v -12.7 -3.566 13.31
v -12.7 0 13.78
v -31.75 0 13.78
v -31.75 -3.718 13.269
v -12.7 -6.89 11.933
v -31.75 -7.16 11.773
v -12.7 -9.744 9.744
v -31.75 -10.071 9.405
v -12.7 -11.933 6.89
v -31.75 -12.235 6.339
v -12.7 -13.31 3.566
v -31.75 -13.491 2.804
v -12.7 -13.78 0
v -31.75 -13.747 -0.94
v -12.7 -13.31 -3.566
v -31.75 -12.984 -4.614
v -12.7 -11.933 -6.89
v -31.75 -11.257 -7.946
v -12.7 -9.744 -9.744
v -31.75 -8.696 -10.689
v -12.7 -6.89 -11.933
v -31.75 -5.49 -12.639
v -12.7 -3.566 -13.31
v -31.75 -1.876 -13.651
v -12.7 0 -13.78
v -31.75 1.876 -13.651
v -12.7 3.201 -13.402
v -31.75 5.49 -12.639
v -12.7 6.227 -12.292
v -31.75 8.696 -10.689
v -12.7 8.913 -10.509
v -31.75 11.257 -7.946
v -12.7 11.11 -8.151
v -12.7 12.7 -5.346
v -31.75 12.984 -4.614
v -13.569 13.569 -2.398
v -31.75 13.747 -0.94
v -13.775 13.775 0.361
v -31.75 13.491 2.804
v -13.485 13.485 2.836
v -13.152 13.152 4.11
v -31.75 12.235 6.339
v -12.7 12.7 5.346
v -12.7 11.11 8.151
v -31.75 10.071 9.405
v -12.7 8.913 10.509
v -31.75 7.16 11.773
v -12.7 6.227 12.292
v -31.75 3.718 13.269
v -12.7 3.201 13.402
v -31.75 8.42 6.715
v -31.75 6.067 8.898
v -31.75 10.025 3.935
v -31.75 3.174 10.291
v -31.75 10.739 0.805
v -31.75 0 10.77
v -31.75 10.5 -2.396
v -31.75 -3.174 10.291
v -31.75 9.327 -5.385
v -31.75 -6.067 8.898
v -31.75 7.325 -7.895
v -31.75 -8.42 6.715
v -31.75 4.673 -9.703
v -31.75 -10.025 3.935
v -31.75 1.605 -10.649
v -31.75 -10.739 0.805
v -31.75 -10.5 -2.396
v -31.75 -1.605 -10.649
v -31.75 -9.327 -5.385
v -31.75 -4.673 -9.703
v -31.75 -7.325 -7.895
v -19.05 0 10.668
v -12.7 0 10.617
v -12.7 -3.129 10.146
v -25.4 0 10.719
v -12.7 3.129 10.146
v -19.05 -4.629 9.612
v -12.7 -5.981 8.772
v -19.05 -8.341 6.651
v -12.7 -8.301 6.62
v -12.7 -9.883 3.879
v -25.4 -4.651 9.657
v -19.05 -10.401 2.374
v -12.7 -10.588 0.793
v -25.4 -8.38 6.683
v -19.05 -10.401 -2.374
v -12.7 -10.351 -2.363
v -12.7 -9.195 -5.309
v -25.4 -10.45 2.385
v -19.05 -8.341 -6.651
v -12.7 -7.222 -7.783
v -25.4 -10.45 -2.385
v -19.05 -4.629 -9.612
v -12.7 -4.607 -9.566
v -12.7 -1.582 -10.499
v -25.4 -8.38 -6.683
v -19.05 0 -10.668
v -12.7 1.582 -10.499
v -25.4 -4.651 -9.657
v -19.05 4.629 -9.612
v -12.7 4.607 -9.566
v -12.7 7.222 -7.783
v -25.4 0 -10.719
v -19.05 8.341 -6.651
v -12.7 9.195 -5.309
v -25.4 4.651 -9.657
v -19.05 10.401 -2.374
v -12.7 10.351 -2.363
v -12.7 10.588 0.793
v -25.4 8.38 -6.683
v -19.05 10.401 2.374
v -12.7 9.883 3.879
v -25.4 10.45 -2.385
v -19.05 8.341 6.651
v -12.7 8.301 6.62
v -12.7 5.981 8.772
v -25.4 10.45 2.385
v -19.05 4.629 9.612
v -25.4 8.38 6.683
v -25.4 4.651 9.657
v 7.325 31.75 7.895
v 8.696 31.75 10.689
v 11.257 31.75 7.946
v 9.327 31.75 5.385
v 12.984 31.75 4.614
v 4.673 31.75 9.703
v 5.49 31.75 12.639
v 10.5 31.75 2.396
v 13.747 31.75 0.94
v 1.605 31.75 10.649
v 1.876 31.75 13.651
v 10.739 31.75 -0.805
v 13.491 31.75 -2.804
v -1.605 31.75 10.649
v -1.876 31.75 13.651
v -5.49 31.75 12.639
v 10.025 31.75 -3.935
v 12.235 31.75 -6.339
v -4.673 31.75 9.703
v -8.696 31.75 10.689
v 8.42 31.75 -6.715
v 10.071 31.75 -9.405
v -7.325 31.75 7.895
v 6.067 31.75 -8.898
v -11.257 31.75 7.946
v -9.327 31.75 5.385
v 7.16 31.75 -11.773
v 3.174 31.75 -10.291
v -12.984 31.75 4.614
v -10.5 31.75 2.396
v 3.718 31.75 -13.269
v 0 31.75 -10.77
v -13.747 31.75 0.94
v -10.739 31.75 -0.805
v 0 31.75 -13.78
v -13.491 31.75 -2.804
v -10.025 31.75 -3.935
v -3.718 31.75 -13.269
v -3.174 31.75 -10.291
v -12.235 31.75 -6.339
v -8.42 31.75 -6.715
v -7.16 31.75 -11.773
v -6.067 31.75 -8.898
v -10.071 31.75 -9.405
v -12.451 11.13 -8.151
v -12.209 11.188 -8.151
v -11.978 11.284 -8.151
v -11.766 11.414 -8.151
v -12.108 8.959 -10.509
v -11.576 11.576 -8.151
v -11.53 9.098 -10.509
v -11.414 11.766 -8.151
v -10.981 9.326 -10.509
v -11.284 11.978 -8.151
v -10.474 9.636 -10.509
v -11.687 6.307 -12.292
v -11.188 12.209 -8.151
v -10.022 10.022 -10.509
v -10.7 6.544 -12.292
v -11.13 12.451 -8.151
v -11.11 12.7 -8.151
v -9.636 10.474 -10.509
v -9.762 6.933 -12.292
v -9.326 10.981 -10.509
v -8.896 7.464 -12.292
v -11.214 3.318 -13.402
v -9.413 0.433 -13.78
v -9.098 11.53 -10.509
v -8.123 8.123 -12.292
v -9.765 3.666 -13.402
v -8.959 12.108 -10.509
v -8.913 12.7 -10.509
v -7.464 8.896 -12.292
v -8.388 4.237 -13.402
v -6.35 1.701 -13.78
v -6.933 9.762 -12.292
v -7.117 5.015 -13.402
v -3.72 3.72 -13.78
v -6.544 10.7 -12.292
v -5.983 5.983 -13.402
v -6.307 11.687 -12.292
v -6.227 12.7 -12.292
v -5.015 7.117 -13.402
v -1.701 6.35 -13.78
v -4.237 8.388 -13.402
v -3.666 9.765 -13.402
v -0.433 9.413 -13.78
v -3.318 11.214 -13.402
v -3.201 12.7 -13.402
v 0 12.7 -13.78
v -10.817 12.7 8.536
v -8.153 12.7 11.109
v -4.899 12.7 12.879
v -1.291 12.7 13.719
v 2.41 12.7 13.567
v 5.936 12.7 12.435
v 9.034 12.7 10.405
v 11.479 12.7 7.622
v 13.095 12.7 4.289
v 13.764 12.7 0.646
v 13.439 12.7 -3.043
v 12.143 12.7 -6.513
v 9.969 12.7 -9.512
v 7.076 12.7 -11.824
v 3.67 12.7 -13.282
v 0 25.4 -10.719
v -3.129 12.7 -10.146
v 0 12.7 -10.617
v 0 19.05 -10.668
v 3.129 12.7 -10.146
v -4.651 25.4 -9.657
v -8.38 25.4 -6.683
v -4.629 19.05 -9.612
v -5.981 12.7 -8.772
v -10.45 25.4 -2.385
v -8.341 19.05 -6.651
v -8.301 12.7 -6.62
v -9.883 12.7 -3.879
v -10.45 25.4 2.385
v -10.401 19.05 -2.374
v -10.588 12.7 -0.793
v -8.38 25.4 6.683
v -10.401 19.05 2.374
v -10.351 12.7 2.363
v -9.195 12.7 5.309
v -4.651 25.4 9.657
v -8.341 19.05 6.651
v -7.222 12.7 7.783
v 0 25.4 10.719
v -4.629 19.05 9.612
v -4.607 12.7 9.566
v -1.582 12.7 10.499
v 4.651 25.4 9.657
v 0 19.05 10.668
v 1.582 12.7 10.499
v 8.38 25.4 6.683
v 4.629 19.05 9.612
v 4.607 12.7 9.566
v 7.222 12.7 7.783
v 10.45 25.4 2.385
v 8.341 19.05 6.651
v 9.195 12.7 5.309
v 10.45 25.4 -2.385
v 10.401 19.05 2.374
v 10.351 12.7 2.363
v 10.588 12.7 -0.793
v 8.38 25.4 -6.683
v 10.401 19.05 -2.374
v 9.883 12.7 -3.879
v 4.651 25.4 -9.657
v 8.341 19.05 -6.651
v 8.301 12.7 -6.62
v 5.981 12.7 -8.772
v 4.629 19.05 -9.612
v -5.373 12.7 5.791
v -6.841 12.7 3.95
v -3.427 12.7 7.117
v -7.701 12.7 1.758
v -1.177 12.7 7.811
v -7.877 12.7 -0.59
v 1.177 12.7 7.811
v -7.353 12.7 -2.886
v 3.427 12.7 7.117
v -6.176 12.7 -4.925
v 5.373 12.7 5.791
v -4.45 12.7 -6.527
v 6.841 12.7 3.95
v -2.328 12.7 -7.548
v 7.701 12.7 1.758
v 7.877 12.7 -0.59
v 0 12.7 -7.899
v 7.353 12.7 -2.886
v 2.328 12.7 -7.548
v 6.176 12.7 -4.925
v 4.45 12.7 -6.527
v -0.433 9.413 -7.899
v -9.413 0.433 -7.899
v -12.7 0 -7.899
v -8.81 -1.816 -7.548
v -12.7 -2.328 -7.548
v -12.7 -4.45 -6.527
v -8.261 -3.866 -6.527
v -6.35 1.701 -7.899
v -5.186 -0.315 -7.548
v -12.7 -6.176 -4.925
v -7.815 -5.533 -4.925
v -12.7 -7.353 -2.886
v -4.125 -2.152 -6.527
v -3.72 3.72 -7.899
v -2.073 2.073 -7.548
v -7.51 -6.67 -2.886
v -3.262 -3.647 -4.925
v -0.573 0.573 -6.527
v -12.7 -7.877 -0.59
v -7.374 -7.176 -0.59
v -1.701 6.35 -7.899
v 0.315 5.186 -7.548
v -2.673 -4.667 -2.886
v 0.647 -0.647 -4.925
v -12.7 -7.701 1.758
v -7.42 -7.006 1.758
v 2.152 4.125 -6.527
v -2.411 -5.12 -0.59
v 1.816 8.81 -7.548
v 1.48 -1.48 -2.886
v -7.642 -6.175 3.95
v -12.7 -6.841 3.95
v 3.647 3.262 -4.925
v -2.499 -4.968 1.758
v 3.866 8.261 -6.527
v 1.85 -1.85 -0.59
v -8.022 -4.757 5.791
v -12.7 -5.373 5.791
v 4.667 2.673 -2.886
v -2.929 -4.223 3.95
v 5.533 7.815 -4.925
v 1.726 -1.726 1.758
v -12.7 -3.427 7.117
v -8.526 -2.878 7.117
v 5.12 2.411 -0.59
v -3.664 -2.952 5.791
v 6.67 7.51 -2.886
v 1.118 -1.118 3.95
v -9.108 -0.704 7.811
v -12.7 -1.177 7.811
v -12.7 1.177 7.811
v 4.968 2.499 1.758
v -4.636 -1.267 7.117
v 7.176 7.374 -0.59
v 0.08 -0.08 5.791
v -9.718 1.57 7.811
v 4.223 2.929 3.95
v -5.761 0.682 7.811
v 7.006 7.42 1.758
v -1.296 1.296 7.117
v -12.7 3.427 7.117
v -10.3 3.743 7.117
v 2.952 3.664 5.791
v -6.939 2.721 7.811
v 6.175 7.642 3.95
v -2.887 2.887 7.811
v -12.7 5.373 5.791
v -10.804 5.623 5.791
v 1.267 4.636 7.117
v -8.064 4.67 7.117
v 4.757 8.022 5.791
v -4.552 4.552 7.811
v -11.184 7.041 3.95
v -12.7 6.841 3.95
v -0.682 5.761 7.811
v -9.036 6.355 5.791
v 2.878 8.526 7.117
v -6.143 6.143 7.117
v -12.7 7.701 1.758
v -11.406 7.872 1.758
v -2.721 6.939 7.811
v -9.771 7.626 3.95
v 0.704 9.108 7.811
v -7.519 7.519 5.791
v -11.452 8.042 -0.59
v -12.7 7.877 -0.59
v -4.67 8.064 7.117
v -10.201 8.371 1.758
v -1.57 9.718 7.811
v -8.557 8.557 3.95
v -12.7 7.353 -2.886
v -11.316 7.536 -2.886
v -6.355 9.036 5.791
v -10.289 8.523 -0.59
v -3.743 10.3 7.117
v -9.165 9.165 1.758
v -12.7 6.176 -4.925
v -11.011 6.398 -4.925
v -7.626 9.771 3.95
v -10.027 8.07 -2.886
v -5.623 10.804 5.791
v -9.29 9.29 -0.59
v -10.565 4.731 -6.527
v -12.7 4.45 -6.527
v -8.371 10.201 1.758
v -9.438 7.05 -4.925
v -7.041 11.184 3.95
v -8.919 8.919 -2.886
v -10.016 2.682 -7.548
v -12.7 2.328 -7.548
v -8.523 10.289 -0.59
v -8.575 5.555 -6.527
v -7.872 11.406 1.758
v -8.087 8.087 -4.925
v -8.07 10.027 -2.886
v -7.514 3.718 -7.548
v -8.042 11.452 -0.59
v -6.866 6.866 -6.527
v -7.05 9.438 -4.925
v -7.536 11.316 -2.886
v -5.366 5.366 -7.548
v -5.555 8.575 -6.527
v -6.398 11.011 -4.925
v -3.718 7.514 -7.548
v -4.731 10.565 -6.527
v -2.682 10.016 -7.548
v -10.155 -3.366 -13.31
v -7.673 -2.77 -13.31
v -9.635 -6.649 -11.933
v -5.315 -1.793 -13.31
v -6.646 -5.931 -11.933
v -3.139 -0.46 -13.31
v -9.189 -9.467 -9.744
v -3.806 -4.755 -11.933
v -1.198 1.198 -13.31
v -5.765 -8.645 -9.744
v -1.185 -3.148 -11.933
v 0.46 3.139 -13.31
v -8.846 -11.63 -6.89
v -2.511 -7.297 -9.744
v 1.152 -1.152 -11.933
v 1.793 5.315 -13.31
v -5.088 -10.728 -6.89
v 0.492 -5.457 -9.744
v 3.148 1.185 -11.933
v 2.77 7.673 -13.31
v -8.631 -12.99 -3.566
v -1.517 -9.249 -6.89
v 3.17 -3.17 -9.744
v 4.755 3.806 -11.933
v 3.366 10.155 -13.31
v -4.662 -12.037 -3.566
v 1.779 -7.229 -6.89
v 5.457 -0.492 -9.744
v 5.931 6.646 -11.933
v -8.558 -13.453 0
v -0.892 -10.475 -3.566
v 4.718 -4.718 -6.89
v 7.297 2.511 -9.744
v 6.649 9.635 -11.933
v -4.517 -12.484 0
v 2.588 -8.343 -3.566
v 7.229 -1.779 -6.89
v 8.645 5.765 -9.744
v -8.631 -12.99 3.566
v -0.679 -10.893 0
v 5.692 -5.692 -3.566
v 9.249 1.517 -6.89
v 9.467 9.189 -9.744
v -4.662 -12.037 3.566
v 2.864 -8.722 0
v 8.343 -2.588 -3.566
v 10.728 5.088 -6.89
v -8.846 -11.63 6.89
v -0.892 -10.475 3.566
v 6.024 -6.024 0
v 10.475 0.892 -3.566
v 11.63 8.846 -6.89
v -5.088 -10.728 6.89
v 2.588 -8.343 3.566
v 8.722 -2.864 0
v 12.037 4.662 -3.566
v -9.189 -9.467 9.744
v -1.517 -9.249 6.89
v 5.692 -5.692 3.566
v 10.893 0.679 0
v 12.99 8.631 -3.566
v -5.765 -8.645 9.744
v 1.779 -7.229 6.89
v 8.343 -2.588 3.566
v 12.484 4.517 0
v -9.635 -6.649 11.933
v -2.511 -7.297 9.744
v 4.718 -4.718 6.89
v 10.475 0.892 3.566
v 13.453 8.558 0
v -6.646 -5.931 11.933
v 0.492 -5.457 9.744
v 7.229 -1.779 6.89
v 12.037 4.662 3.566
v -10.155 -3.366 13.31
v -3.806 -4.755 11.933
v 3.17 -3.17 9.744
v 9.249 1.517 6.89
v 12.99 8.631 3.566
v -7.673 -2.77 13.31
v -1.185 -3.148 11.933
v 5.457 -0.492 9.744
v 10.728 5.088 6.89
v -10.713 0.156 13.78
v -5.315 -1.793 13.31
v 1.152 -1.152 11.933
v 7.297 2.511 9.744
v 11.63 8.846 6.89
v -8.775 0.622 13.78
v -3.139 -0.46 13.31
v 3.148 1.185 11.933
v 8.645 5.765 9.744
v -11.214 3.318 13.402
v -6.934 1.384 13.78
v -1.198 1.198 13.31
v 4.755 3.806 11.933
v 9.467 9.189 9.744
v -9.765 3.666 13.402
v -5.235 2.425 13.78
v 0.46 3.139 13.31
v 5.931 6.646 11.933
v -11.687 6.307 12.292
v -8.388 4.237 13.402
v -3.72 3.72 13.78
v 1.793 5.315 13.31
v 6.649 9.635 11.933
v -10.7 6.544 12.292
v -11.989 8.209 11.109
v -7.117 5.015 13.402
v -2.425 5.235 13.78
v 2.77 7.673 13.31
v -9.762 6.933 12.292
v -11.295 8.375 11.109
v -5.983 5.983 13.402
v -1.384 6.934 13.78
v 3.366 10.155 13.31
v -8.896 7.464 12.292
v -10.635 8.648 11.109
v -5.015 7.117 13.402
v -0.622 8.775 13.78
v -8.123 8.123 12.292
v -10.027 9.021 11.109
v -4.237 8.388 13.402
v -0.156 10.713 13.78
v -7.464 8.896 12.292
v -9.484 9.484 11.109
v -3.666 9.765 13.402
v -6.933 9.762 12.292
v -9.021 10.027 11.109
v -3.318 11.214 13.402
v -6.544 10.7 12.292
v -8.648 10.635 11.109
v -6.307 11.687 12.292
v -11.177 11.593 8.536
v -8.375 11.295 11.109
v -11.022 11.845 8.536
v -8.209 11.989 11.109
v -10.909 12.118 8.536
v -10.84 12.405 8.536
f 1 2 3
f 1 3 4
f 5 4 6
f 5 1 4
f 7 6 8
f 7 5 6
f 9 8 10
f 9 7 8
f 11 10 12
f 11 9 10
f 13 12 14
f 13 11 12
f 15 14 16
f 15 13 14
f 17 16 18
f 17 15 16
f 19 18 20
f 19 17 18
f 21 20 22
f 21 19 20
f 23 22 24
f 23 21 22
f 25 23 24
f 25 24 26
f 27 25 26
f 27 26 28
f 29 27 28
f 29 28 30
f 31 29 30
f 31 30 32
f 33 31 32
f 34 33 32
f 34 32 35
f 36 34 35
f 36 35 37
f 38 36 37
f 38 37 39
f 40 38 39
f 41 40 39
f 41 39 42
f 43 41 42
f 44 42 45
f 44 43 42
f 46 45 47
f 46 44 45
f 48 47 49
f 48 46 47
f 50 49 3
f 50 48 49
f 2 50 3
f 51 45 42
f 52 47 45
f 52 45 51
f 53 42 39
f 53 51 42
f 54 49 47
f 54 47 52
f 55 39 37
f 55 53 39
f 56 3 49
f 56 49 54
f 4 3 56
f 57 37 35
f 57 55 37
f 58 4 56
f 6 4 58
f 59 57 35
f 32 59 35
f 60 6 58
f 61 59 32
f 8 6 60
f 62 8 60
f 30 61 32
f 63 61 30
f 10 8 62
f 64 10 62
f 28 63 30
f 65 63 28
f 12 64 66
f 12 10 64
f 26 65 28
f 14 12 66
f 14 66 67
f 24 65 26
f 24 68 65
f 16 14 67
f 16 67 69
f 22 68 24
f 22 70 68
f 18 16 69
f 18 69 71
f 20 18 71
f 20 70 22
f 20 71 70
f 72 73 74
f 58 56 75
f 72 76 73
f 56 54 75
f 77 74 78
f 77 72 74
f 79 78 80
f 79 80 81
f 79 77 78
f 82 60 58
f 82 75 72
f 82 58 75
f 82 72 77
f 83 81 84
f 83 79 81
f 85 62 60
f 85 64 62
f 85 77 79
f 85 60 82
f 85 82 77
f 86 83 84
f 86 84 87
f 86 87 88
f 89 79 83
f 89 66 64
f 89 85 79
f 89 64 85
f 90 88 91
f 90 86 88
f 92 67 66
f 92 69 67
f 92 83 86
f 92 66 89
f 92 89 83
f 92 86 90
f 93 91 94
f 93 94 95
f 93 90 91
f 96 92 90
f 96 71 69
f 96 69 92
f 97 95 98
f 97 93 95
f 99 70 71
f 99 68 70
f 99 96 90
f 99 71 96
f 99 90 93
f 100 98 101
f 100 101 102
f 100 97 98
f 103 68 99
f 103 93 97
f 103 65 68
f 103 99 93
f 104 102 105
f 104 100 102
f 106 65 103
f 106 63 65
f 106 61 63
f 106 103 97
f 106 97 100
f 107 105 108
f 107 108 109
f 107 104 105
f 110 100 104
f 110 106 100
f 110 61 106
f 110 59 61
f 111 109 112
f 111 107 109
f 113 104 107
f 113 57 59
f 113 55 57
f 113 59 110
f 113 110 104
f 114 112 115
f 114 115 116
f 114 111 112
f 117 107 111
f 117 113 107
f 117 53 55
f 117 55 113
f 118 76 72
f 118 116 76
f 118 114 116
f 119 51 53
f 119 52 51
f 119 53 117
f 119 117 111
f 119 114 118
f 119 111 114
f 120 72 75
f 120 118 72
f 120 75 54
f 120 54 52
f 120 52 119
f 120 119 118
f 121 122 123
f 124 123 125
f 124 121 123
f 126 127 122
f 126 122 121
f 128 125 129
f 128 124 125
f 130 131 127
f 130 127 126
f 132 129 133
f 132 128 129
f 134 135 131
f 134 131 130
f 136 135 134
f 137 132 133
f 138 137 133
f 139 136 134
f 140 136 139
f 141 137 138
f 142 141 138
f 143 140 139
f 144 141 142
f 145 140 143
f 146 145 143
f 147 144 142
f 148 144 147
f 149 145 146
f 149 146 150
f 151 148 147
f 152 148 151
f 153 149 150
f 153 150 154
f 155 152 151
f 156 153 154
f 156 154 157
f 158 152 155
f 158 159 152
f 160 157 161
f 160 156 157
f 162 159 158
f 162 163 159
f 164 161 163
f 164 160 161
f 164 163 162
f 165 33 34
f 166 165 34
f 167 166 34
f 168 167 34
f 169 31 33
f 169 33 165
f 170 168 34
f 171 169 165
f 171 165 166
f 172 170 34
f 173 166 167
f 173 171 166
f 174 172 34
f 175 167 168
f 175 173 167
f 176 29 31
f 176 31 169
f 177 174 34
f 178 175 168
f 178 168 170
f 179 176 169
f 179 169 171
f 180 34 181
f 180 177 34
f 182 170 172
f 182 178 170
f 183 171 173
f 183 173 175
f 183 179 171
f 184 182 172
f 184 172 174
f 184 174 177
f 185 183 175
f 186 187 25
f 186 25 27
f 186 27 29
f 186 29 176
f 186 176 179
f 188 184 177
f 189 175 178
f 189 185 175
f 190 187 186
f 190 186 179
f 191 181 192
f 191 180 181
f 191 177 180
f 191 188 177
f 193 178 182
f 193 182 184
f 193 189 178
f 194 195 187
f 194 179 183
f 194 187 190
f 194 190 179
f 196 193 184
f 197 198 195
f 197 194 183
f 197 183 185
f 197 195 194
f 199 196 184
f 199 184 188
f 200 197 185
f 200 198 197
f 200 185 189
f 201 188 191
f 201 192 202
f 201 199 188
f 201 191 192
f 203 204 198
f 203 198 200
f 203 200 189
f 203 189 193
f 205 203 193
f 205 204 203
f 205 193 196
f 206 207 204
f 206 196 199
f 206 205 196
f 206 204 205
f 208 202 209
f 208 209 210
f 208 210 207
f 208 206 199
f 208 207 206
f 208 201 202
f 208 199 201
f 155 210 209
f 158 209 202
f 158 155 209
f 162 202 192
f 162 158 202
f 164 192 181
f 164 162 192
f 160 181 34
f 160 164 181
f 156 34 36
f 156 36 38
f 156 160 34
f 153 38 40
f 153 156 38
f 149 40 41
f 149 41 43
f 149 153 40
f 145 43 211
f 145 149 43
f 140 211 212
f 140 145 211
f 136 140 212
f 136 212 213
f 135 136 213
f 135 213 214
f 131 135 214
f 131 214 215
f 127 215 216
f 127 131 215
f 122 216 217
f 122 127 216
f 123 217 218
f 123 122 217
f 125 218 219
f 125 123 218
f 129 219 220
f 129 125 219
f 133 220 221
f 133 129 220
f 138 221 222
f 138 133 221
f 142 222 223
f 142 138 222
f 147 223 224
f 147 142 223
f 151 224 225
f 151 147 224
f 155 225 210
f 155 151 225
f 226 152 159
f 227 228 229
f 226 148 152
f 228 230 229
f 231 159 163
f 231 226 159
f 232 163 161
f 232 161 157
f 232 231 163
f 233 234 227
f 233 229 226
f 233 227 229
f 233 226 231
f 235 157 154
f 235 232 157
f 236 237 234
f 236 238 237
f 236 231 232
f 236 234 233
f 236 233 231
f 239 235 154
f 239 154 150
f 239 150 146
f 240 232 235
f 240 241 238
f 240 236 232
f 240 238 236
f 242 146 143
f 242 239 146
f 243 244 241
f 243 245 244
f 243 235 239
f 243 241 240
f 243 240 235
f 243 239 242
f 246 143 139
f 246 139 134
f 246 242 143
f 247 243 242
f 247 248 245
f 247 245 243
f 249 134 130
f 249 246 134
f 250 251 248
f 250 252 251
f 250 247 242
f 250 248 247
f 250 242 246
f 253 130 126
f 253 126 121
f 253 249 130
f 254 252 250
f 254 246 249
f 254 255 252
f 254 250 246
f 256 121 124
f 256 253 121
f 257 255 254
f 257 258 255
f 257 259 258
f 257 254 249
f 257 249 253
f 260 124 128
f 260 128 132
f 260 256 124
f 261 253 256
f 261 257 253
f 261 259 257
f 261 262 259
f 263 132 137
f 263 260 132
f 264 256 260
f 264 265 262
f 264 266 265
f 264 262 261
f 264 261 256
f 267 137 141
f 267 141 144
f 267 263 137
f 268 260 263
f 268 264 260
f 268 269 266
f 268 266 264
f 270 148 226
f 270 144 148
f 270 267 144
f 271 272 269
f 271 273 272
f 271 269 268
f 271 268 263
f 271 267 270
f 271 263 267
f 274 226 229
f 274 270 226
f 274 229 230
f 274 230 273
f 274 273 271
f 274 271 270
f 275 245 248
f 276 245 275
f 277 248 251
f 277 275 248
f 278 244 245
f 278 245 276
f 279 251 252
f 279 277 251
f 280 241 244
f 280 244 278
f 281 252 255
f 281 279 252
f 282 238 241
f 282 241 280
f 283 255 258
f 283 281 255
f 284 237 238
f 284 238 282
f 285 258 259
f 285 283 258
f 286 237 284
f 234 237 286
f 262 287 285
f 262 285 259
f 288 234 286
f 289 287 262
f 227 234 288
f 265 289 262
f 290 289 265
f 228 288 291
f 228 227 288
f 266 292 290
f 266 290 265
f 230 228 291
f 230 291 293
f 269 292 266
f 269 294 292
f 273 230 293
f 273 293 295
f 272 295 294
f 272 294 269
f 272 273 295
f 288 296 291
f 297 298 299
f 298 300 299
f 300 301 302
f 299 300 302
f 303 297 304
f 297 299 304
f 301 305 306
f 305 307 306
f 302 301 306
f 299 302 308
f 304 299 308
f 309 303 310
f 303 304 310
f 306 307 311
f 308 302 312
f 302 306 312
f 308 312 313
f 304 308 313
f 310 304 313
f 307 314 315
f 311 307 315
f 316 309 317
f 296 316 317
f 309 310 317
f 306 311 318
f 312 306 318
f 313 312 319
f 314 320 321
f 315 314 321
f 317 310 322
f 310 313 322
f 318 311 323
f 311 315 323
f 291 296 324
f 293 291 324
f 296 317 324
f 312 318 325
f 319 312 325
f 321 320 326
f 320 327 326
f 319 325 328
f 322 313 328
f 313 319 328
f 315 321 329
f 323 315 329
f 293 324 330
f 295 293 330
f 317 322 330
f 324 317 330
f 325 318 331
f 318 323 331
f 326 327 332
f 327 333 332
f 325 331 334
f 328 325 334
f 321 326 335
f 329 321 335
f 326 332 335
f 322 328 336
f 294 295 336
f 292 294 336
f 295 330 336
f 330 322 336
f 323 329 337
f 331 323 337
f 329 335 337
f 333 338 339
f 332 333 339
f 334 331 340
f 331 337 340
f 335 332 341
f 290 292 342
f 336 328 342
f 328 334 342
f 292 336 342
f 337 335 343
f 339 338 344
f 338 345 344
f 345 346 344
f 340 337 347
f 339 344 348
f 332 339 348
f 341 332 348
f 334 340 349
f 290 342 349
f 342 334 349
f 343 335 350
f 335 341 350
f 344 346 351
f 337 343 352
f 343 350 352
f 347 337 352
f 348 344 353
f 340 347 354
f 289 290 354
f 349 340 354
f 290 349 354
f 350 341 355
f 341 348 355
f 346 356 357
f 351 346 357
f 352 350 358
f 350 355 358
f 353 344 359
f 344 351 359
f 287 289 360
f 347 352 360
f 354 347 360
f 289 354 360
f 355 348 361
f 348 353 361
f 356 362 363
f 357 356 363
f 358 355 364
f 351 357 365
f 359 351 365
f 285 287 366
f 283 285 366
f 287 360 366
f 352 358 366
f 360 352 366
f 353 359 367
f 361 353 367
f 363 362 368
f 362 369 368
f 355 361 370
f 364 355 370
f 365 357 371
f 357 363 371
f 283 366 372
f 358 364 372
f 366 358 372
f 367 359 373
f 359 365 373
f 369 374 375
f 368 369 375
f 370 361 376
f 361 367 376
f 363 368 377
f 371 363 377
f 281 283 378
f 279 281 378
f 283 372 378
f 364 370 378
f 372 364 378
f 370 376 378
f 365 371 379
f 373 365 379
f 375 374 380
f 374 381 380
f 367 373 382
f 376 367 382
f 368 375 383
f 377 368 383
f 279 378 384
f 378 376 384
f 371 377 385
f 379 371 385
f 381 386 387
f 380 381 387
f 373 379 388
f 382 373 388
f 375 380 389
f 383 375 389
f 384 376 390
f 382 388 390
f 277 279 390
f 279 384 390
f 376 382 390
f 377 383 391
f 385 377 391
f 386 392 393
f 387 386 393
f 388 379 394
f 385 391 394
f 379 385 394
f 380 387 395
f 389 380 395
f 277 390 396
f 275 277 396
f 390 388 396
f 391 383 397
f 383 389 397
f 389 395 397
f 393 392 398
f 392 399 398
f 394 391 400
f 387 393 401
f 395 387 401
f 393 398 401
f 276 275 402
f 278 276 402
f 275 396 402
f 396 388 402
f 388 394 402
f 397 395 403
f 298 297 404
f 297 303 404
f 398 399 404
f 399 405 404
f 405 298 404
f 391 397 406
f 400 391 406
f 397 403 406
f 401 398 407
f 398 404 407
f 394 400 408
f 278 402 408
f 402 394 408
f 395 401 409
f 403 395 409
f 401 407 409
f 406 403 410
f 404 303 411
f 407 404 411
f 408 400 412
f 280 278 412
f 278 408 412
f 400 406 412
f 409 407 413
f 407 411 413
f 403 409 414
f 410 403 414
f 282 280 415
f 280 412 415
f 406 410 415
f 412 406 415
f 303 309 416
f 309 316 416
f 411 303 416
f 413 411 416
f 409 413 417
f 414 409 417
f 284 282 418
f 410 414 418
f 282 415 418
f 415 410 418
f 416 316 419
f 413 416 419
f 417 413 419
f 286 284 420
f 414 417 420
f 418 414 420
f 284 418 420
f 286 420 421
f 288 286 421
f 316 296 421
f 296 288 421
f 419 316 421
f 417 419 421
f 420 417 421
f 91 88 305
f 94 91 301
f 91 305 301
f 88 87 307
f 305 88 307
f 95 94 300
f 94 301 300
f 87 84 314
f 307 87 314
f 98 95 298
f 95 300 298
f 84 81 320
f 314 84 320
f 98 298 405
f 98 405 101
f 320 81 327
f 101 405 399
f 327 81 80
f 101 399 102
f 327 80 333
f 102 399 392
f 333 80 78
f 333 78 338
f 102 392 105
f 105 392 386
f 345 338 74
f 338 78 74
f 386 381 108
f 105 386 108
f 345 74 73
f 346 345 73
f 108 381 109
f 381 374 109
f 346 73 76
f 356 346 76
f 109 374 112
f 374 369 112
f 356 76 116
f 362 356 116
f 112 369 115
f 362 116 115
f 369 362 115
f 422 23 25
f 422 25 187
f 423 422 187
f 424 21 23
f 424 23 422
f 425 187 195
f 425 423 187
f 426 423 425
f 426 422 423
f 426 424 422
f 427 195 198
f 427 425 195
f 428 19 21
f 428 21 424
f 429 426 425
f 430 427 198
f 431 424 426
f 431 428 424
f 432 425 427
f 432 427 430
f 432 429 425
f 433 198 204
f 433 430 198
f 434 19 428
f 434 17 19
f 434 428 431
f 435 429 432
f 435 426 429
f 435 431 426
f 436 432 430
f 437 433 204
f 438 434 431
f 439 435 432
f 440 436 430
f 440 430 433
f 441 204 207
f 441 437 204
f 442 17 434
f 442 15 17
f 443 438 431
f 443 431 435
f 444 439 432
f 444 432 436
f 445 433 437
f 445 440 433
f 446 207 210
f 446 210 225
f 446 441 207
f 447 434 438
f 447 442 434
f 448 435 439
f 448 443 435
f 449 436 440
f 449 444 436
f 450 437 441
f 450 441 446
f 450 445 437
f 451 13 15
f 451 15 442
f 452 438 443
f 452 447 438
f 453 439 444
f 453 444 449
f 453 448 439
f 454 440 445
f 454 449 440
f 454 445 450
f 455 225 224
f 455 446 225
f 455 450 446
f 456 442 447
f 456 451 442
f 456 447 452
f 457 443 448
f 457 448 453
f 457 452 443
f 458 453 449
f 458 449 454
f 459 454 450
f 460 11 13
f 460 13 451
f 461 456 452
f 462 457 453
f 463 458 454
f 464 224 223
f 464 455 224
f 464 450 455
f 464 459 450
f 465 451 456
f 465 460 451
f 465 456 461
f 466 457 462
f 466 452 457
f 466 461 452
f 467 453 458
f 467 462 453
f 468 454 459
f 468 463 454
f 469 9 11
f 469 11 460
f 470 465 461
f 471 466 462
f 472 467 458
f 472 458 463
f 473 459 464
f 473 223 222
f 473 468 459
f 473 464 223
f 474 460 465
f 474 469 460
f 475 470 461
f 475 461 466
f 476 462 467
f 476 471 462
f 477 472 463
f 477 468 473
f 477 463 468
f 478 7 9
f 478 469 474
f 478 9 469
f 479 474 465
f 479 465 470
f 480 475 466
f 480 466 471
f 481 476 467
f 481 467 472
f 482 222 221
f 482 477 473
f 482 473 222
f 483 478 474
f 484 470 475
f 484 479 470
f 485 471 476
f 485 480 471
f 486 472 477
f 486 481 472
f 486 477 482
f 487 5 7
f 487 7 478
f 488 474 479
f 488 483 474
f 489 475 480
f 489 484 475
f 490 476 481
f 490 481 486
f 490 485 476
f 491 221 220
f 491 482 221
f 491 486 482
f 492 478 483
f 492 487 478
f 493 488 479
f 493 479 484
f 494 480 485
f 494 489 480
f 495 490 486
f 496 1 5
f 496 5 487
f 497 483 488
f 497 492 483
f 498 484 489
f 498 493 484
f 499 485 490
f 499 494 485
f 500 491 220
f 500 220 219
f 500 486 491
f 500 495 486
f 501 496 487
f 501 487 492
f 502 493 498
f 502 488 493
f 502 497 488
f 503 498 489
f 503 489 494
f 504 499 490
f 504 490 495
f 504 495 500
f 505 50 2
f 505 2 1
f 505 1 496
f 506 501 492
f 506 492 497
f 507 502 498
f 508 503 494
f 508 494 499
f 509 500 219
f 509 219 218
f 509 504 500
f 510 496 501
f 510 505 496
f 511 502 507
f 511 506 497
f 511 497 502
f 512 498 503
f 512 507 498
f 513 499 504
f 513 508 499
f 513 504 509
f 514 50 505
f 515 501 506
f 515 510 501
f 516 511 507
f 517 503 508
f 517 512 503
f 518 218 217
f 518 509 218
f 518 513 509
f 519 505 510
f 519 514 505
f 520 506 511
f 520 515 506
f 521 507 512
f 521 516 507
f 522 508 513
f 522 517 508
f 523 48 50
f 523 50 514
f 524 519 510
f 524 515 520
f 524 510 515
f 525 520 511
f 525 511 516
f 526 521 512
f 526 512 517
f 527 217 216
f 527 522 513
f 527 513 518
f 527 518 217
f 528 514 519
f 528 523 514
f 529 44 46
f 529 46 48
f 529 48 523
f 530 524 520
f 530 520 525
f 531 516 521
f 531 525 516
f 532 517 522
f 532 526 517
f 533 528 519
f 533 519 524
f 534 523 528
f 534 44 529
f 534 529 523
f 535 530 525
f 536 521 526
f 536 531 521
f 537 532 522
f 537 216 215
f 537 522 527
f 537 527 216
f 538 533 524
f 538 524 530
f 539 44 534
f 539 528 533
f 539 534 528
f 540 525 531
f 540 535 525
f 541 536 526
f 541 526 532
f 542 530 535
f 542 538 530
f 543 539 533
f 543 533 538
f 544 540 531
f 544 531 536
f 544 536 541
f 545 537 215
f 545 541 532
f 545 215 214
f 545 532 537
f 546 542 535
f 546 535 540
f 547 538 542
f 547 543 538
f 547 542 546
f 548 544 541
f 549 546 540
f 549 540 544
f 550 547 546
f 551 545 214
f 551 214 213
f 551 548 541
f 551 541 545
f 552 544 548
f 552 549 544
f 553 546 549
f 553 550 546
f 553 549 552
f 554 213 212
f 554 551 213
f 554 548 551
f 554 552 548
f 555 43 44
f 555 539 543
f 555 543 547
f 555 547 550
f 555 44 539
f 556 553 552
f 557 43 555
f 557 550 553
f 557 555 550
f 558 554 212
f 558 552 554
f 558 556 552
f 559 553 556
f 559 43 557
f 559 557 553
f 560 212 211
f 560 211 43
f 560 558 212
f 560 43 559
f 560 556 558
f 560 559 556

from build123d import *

# Parameters (mm, degrees)
SKETCH3_R   = 13.7795
SKETCH3_R_2 = 7.8994


with BuildPart() as part:
    # Sketch1 → Revolve1 (revolve)
    with BuildSketch(Plane.XY):
        Polygon((-31.75, -13.7795), (-12.7, -13.7795), (-12.7, -10.6172), (-31.75, -10.7696), align=None)
    revolve(axis=Axis((-31.75, 0, 0), (1, 0, 0)))


with BuildPart() as body_2:
    # Sketch2 → Revolve2 (revolve)
    with BuildSketch(Plane.XY):
        Polygon((10.7696, 31.75), (10.6172, 12.7), (13.7795, 12.7), (13.7795, 31.75), align=None)
    revolve(axis=Axis((0, 0, 0), (0, 1, 0)))


with BuildPart() as sweep1_tool:
    # Sweep1: sweep along a path in Sketch4
    with BuildLine(Plane.XY) as sweep1_path:
        ThreePointArc((-12.7, 0), (-3.719744, 3.719744), (0, 12.7))
    # Sketch3 → Sweep1 (sweep)
    with BuildSketch(Plane(origin=(-12.7, 0, 0), x_dir=(0, 0, -1), z_dir=(1, 0, 0))):
        Circle(SKETCH3_R)
        Circle(SKETCH3_R_2, mode=Mode.SUBTRACT)
    sweep(path=sweep1_path.line)


with BuildPart() as part_1:
    add(part.part)


with BuildPart() as part_2:
    # Sweep1: joined with sweep1_tool
    add(part_1.part.fuse(sweep1_tool.part, body_2.part, tol=0.00001))


solid = part_2.part
